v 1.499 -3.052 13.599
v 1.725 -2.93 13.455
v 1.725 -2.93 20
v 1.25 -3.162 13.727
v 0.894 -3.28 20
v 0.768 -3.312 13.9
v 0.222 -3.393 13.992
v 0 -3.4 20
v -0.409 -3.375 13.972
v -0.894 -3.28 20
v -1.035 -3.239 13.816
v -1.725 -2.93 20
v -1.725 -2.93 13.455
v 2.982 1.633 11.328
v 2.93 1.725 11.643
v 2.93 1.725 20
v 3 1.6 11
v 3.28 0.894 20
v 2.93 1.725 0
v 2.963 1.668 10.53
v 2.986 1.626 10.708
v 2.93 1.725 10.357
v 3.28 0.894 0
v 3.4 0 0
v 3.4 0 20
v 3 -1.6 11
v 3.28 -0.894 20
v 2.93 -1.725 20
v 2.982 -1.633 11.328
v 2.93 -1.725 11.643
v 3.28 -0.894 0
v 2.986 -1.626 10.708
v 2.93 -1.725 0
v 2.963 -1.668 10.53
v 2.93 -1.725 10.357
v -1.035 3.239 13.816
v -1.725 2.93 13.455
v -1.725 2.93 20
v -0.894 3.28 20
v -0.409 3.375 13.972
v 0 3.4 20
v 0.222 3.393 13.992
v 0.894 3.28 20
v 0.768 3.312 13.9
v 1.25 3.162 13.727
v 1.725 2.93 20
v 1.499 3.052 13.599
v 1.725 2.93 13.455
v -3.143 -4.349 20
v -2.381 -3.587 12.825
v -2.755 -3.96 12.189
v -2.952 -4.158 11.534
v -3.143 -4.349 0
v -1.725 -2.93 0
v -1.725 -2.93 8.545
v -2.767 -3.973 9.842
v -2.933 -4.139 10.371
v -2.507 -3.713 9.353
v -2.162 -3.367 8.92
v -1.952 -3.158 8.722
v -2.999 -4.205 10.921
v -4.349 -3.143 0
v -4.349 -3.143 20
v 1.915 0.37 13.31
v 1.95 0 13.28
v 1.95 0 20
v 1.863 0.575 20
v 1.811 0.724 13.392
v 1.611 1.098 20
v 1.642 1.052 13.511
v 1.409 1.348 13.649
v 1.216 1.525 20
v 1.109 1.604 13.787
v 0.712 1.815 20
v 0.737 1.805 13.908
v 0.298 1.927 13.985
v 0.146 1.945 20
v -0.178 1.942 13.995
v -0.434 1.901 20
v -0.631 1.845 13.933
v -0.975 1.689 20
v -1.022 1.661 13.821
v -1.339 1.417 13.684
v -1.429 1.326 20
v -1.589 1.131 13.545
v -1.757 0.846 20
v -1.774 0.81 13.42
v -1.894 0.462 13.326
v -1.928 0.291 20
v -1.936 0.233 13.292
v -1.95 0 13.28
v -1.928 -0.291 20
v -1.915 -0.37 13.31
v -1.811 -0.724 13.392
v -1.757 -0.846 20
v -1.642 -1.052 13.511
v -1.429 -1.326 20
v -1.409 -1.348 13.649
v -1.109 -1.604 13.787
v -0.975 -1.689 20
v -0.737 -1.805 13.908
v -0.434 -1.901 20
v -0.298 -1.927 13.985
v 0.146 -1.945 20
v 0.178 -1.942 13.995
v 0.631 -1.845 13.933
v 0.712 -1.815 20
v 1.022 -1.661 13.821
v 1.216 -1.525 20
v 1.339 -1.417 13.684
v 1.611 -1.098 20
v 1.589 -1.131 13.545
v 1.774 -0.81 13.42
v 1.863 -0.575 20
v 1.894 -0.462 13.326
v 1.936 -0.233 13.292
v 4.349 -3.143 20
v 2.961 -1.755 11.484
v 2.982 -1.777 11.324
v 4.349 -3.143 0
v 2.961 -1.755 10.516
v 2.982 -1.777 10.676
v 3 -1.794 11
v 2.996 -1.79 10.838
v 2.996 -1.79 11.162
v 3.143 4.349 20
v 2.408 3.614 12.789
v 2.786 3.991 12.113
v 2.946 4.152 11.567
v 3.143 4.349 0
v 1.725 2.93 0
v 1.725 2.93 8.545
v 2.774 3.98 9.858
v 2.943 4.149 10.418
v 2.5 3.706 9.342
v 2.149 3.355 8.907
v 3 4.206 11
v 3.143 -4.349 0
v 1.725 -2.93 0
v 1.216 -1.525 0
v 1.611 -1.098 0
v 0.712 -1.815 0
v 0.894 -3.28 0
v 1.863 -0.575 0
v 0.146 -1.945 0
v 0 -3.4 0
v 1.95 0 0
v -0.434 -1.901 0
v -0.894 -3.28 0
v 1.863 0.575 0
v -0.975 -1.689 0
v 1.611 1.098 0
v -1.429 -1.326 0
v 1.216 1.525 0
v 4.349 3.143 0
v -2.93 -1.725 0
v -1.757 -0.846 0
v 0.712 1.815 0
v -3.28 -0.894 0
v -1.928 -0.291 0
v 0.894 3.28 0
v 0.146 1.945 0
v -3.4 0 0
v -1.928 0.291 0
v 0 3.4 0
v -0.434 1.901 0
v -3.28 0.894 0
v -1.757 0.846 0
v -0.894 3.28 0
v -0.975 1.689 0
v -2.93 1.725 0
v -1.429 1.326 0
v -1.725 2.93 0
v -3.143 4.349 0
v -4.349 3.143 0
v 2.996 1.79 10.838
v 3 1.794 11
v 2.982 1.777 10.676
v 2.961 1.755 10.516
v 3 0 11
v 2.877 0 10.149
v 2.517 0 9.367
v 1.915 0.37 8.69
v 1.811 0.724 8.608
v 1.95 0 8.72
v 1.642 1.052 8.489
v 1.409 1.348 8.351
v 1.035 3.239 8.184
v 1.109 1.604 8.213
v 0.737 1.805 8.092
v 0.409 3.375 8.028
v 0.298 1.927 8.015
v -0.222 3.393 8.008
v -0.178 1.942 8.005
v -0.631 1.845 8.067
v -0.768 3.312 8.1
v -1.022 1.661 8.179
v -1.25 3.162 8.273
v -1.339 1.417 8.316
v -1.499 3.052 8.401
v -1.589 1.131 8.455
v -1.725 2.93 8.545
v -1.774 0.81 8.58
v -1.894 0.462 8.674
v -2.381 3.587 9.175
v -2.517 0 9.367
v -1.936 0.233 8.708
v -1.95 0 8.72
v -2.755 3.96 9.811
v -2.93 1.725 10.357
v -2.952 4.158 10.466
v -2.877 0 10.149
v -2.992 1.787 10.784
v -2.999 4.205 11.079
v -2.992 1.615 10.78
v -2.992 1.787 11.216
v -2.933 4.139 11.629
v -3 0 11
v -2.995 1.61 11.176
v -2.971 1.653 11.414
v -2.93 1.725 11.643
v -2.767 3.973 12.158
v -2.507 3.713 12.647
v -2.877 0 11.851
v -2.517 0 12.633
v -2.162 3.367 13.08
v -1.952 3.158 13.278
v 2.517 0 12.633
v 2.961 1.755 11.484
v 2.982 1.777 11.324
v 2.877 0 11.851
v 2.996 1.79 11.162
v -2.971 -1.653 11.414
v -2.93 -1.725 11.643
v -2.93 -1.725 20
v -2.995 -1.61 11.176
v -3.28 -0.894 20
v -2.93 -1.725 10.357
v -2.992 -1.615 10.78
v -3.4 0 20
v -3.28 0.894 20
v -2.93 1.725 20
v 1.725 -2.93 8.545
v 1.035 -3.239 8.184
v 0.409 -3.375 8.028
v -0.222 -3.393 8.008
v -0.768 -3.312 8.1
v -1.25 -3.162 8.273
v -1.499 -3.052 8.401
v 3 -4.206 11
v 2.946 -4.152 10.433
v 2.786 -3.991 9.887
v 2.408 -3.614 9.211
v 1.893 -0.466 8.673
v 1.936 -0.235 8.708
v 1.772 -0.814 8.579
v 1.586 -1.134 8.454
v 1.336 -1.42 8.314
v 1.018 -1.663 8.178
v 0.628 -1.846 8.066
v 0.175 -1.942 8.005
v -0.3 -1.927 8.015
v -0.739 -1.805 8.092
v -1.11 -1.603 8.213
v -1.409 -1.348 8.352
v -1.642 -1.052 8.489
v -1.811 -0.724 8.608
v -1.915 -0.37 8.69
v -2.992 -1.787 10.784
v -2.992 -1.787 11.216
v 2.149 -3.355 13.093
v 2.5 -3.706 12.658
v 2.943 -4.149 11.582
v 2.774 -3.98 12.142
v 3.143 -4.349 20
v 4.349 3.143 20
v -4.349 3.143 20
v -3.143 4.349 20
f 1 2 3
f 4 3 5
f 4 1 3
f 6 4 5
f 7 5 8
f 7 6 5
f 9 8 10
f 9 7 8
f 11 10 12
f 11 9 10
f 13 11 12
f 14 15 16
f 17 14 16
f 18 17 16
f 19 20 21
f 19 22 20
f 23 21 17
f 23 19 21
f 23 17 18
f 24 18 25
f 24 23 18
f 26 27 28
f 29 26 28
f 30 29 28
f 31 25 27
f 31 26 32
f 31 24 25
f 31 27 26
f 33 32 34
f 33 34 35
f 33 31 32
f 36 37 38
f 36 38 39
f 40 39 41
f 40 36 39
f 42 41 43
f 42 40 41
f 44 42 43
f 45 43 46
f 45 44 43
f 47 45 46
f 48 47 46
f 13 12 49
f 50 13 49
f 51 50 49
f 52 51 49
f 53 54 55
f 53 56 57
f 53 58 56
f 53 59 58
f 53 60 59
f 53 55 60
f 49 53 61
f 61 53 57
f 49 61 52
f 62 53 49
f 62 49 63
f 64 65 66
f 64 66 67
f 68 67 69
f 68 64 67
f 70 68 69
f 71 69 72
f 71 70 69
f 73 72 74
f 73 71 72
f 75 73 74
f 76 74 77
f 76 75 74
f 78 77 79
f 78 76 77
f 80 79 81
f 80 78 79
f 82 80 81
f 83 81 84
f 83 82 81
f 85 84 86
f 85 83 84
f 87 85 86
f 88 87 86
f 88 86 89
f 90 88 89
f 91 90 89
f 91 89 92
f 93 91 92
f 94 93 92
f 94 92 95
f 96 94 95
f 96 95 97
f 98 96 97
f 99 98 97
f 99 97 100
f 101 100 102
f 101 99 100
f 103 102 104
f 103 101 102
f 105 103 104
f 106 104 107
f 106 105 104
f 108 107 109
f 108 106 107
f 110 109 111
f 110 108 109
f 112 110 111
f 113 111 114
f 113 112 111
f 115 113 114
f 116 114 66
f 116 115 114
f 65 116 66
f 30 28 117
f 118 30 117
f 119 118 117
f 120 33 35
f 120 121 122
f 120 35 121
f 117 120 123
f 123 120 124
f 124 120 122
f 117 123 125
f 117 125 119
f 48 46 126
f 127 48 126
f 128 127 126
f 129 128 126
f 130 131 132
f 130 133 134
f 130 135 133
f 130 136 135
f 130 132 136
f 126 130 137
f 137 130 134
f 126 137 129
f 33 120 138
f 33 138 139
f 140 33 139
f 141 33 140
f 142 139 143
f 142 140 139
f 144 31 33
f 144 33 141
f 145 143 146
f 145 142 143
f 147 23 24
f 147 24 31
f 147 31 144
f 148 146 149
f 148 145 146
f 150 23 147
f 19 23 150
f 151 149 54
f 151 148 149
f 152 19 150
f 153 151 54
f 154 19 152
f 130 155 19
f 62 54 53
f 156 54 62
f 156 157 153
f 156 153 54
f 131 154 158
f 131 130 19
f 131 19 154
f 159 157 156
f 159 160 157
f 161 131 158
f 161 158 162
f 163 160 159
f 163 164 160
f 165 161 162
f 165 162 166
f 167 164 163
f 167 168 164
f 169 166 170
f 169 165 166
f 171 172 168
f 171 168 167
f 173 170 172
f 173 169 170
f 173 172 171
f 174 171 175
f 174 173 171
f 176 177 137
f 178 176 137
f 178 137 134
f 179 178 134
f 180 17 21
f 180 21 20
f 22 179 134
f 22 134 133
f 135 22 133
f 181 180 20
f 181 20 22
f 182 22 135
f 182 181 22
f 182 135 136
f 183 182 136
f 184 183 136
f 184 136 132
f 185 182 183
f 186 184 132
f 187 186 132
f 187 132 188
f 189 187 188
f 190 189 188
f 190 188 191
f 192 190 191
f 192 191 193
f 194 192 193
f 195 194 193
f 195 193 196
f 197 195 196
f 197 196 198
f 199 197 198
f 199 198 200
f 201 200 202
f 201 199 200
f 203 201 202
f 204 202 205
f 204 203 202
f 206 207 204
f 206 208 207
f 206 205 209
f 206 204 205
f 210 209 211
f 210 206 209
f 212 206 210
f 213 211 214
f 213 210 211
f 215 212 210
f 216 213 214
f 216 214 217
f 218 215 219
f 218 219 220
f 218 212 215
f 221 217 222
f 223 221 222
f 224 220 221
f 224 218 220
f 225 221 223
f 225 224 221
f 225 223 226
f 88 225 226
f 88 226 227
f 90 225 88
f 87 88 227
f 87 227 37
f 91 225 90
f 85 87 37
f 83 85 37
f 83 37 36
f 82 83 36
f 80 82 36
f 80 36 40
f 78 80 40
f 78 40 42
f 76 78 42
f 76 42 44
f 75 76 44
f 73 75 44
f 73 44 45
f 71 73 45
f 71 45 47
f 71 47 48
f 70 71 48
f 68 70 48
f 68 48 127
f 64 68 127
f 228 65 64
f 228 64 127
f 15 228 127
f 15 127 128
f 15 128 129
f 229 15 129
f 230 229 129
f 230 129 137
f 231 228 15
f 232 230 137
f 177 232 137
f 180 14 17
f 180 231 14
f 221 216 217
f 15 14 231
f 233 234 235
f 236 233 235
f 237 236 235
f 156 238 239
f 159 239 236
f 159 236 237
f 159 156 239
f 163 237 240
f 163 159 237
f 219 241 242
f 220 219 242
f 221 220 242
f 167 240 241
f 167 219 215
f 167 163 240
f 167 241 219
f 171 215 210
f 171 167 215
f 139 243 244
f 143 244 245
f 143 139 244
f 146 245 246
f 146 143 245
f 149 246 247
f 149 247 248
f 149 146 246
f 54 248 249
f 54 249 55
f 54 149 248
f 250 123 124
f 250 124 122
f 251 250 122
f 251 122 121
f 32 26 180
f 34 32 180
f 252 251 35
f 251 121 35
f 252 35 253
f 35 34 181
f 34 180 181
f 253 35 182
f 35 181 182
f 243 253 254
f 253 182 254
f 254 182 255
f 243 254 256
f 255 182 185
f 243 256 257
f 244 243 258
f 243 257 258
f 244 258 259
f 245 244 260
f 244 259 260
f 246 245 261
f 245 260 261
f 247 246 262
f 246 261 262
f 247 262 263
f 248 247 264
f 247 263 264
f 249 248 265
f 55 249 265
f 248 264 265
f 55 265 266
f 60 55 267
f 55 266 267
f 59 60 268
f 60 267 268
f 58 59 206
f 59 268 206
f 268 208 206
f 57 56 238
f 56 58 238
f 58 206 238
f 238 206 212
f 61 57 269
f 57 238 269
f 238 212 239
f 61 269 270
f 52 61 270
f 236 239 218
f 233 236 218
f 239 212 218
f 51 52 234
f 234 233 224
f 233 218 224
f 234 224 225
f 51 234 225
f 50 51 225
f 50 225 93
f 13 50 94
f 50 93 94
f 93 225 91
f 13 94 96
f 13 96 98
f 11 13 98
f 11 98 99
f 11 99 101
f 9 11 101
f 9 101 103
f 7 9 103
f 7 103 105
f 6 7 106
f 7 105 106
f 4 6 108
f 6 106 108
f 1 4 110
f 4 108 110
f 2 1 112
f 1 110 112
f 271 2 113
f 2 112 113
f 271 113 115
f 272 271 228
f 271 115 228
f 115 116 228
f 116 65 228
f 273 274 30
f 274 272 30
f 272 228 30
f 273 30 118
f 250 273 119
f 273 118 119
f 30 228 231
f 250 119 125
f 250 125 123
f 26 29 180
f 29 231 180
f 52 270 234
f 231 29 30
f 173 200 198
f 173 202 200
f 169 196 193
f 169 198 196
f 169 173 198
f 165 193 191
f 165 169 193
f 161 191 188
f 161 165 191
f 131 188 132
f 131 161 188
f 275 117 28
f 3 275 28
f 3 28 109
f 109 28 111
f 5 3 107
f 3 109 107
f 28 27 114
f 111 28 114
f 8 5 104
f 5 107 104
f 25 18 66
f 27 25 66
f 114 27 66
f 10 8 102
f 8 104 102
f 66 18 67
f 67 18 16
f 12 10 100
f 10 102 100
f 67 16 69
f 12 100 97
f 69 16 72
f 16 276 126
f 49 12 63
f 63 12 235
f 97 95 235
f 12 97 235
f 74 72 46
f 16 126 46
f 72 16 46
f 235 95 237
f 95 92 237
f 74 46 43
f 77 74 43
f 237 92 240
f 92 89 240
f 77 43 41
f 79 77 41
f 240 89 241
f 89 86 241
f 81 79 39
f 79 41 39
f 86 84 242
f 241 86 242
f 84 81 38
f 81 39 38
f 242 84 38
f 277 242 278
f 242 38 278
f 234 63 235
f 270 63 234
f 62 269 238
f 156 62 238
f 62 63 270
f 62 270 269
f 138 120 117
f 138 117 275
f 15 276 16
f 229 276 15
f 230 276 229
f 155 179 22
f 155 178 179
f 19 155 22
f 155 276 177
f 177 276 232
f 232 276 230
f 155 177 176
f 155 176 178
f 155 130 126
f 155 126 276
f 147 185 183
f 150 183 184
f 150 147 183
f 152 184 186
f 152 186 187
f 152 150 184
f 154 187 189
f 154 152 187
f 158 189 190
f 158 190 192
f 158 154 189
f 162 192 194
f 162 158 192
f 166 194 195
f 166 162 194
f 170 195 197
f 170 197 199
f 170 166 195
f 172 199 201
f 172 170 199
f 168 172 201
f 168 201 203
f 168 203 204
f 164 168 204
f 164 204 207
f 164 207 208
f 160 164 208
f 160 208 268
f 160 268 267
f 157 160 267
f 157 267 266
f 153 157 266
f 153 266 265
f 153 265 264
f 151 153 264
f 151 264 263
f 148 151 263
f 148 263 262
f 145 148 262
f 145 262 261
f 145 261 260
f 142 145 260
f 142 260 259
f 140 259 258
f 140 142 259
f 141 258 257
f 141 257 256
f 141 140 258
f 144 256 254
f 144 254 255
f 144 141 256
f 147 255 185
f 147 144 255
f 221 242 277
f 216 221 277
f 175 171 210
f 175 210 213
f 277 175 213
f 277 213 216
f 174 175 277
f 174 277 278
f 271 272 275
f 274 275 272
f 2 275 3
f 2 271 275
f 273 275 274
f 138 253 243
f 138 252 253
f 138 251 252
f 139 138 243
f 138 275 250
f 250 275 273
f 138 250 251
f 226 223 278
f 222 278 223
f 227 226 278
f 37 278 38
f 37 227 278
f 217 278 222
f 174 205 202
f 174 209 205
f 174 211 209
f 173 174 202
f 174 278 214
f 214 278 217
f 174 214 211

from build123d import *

# Parameters (mm, degrees)
SKETCH1_R               = 1.95
BOSS_EXTRUDE1_DEPTH     = 20
CUT_EXTRUDE1_DEPTH      = 20
CUT_EXTRUDE1_DEPTH_BACK = 20
SKETCH2_R               = 3


with BuildPart() as part:
    # Sketch1 → Boss-Extrude1 (new body)
    with BuildSketch(Plane.XY):
        with BuildLine():
            Line((3.143089642, 4.348706704), (4.348706704, 3.143089642))
            Line((4.348706704, 3.143089642), (2.930172249, 1.724555187))
            ThreePointArc((2.930172249, 1.724555187), (3.4, 0), (2.930172249, -1.724555187))
            Line((2.930172249, -1.724555187), (4.348706704, -3.143089642))
            Line((4.348706704, -3.143089642), (3.143089642, -4.348706704))
            Line((3.143089642, -4.348706704), (1.724555187, -2.930172249))
            ThreePointArc((1.724555187, -2.930172249), (0, -3.4), (-1.724555187, -2.930172249))
            Line((-1.724555187, -2.930172249), (-3.143089642, -4.348706704))
            Line((-3.143089642, -4.348706704), (-4.348706704, -3.143089642))
            Line((-4.348706704, -3.143089642), (-2.930172249, -1.724555187))
            ThreePointArc((-2.930172249, -1.724555187), (-3.4, 0), (-2.930172249, 1.724555187))
            Line((-2.930172249, 1.724555187), (-4.348706704, 3.143089642))
            Line((-4.348706704, 3.143089642), (-3.143089642, 4.348706704))
            Line((-3.143089642, 4.348706704), (-1.724555187, 2.930172249))
            ThreePointArc((-1.724555187, 2.930172249), (0, 3.4), (1.724555187, 2.930172249))
            Line((1.724555187, 2.930172249), (3.143089642, 4.348706704))
        make_face()
        Circle(SKETCH1_R, mode=Mode.SUBTRACT)
    extrude(amount=BOSS_EXTRUDE1_DEPTH)

    # Sketch2 → Cut-Extrude1 (cut, two sides: drawn at the far end of the back side and taken through both)
    with BuildSketch(Plane(origin=(0, 0, 0), x_dir=(1, 0, 0), z_dir=(0, 1, 0)).offset(-CUT_EXTRUDE1_DEPTH_BACK)):
        with Locations((0, -11)):
            Circle(SKETCH2_R)
    extrude(amount=CUT_EXTRUDE1_DEPTH + CUT_EXTRUDE1_DEPTH_BACK, mode=Mode.SUBTRACT)


solid = part.part
